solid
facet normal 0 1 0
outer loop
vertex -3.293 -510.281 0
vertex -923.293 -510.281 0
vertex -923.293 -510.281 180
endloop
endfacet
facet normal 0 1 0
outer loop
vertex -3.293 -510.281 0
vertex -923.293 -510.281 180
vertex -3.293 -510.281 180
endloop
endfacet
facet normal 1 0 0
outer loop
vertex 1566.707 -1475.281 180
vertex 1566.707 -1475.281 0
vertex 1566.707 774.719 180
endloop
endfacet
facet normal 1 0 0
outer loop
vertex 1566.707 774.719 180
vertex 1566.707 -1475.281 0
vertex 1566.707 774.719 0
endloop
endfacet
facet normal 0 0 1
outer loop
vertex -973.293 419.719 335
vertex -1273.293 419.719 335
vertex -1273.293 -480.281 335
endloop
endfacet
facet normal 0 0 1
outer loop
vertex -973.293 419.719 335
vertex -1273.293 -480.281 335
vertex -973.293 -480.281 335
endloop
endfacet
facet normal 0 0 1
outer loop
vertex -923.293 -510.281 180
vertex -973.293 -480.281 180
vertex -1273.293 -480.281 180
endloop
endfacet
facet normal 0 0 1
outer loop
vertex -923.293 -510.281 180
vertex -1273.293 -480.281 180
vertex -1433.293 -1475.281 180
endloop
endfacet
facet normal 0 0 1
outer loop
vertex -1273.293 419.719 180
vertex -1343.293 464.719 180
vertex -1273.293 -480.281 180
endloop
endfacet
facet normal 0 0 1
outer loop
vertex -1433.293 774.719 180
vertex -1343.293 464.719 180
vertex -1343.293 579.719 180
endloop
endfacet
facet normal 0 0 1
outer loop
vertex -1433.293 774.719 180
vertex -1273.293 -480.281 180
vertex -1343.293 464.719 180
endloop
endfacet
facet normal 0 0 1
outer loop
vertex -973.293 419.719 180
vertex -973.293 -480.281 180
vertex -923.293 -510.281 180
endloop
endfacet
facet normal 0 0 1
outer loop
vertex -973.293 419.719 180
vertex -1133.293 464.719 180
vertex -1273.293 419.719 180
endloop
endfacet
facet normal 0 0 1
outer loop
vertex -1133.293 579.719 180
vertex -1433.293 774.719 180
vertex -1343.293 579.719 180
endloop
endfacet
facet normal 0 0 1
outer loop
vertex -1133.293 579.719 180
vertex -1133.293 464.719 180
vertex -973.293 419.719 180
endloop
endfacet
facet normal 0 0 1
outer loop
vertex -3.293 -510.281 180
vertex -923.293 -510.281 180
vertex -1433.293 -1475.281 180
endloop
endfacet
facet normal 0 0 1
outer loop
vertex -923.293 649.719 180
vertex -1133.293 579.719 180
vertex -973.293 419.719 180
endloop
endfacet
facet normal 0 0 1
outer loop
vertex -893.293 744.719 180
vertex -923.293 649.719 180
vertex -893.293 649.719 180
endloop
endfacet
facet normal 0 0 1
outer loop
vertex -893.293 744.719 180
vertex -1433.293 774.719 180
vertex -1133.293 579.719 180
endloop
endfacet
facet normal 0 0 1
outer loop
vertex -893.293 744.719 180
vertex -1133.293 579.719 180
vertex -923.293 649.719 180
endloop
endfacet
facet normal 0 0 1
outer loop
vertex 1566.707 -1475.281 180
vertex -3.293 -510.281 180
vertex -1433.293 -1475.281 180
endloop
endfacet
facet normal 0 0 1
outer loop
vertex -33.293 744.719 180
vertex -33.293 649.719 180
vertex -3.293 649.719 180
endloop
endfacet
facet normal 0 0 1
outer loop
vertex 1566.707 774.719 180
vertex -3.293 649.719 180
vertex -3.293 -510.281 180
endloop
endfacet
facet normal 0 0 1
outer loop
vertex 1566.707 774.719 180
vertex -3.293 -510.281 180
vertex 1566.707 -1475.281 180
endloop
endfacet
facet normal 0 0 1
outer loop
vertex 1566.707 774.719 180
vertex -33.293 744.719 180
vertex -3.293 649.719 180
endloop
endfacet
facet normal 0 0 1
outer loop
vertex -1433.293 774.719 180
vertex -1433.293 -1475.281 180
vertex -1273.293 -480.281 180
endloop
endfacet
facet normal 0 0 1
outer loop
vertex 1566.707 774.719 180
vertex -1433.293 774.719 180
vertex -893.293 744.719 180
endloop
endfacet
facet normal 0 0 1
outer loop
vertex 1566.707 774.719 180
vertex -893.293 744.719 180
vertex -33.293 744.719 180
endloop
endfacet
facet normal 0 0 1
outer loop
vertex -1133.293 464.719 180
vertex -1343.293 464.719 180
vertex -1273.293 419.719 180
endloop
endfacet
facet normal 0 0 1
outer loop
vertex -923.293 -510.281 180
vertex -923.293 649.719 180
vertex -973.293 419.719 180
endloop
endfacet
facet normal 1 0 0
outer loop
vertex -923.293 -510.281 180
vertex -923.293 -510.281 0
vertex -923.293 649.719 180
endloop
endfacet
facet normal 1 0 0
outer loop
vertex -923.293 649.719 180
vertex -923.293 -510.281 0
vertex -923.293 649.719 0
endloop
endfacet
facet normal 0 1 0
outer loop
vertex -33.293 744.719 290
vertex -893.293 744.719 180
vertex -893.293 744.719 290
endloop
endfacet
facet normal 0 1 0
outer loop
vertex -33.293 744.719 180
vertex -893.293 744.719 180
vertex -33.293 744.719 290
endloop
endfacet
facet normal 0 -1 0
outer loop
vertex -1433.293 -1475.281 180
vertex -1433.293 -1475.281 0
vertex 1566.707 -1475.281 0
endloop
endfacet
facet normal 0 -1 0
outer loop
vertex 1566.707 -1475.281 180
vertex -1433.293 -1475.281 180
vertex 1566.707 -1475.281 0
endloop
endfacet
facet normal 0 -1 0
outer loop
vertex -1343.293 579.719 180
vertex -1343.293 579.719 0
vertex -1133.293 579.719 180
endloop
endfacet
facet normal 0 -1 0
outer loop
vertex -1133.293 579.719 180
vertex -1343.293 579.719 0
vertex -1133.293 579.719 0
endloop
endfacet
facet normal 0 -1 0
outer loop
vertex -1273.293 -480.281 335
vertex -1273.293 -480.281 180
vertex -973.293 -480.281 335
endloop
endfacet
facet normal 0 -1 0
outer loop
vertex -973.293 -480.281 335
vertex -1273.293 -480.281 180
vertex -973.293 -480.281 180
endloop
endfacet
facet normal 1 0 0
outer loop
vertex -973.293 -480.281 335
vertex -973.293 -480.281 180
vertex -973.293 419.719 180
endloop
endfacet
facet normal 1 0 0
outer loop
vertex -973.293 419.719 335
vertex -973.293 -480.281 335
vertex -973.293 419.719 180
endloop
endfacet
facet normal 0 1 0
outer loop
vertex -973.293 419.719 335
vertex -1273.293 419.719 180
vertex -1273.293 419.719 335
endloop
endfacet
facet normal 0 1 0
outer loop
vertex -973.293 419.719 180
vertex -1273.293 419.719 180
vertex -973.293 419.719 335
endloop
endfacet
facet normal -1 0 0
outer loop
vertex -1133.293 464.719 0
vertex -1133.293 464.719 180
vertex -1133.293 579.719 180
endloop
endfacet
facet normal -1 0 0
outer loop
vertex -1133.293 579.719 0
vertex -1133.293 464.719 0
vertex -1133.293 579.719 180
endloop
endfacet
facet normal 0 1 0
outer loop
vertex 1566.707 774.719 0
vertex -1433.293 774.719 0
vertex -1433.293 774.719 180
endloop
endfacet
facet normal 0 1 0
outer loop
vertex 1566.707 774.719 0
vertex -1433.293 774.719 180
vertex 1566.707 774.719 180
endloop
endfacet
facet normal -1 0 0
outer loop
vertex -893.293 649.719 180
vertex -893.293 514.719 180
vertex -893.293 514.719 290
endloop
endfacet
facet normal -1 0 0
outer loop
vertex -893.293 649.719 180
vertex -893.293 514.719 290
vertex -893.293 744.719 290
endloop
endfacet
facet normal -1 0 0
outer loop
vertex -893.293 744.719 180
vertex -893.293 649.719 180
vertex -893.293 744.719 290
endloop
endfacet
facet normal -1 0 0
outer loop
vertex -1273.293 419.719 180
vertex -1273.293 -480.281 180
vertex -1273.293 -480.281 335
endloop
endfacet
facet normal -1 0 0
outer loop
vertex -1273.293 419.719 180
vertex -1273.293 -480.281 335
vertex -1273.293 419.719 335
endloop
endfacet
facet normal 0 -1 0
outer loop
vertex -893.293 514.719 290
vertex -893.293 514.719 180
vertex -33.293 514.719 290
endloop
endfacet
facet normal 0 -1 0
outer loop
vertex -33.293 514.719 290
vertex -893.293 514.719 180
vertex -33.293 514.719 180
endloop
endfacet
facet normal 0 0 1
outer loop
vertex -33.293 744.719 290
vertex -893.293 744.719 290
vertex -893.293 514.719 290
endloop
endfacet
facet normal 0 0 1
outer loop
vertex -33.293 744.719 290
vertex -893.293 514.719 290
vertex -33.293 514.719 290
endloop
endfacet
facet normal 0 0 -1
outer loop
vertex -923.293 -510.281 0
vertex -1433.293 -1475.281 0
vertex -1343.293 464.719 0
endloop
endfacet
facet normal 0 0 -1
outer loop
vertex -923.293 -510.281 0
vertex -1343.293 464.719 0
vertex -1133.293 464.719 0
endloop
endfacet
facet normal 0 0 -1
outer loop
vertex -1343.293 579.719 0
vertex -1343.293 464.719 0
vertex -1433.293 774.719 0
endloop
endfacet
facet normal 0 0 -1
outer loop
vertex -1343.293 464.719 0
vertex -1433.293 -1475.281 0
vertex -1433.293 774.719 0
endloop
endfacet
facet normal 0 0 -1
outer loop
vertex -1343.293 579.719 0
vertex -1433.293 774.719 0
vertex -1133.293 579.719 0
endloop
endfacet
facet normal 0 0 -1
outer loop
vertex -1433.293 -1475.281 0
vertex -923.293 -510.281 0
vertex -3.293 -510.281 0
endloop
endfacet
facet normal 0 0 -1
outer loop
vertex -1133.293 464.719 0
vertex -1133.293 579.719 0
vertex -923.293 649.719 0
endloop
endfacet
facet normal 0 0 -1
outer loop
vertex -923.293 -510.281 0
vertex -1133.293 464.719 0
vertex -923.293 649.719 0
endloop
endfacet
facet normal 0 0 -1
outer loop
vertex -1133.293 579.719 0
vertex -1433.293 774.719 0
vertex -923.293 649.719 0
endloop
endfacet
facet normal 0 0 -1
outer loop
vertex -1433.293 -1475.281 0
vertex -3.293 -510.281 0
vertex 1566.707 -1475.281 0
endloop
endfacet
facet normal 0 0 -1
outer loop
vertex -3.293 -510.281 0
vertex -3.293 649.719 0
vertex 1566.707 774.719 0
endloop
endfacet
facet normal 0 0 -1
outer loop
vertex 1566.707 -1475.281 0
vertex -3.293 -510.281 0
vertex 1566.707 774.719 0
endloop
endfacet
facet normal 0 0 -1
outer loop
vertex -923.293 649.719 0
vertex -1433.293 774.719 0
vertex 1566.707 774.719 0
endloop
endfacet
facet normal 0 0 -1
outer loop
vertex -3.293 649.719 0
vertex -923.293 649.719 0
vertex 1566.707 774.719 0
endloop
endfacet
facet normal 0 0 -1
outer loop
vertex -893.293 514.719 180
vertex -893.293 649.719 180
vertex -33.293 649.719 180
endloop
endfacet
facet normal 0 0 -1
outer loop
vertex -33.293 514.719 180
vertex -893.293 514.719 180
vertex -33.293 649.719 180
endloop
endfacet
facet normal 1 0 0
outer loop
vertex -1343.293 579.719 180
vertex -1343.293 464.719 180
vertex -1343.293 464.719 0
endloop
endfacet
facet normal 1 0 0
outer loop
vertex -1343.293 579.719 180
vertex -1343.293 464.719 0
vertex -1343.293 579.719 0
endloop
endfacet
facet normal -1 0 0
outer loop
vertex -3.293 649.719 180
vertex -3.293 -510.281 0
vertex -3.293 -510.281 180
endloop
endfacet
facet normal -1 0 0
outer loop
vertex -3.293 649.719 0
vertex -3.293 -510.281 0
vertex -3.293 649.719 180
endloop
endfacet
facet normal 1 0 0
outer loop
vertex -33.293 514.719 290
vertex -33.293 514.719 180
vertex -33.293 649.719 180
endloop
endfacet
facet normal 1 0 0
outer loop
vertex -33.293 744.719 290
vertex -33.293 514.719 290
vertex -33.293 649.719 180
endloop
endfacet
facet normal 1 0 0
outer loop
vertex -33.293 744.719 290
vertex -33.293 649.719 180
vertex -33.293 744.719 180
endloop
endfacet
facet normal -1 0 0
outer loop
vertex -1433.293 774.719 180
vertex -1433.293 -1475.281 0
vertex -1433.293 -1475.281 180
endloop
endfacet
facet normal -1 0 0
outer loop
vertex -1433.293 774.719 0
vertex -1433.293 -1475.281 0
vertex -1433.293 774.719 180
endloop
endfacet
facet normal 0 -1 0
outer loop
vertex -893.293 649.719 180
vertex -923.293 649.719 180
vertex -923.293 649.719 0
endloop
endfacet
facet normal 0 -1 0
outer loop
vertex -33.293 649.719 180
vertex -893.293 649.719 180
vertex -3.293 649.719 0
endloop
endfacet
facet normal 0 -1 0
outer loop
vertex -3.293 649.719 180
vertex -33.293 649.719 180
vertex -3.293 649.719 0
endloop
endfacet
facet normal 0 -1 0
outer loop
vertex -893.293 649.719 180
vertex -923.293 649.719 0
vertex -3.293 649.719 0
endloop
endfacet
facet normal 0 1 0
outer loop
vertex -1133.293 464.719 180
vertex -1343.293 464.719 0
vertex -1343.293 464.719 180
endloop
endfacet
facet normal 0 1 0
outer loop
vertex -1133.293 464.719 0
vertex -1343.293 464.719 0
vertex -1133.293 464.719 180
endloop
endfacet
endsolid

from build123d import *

# Parameters (mm, degrees)
SKETCH1_W           = 3000
SKETCH1_H           = 2250
SKETCH1_W_2         = 210
SKETCH1_H_2         = 115
SKETCH1_W_3         = 920
SKETCH1_H_3         = 1160
BOSS_EXTRUDE1_DEPTH = 180
SKETCH2_W           = 300
SKETCH2_H           = 900
BOSS_EXTRUDE2_DEPTH = 155
SKETCH3_W           = 860
SKETCH3_H           = 230
BOSS_EXTRUDE3_DEPTH = 110


with BuildPart() as part:
    # Sketch1 → Boss-Extrude1 (new body)
    with BuildSketch(Plane.XY):
        with Locations((66.706806947, -350.280539566)):
            Rectangle(SKETCH1_W, SKETCH1_H)
        with Locations((-1238.293193053, 522.219460434)):
            Rectangle(SKETCH1_W_2, SKETCH1_H_2, mode=Mode.SUBTRACT)
        with Locations((-463.293193053, 69.719460434)):
            Rectangle(SKETCH1_W_3, SKETCH1_H_3, mode=Mode.SUBTRACT)
    extrude(amount=BOSS_EXTRUDE1_DEPTH)

    # Sketch2 → Boss-Extrude2 (add)
    with BuildSketch(Plane.XY.offset(180)):
        with Locations((-1123.293193053, -30.280539566)):
            Rectangle(SKETCH2_W, SKETCH2_H)
    extrude(amount=BOSS_EXTRUDE2_DEPTH)

    # Sketch3 → Boss-Extrude3 (add)
    with BuildSketch(Plane.XY.offset(180)):
        with Locations((-463.293193053, 629.719460434)):
            Rectangle(SKETCH3_W, SKETCH3_H)
    extrude(amount=BOSS_EXTRUDE3_DEPTH)


solid = part.part
